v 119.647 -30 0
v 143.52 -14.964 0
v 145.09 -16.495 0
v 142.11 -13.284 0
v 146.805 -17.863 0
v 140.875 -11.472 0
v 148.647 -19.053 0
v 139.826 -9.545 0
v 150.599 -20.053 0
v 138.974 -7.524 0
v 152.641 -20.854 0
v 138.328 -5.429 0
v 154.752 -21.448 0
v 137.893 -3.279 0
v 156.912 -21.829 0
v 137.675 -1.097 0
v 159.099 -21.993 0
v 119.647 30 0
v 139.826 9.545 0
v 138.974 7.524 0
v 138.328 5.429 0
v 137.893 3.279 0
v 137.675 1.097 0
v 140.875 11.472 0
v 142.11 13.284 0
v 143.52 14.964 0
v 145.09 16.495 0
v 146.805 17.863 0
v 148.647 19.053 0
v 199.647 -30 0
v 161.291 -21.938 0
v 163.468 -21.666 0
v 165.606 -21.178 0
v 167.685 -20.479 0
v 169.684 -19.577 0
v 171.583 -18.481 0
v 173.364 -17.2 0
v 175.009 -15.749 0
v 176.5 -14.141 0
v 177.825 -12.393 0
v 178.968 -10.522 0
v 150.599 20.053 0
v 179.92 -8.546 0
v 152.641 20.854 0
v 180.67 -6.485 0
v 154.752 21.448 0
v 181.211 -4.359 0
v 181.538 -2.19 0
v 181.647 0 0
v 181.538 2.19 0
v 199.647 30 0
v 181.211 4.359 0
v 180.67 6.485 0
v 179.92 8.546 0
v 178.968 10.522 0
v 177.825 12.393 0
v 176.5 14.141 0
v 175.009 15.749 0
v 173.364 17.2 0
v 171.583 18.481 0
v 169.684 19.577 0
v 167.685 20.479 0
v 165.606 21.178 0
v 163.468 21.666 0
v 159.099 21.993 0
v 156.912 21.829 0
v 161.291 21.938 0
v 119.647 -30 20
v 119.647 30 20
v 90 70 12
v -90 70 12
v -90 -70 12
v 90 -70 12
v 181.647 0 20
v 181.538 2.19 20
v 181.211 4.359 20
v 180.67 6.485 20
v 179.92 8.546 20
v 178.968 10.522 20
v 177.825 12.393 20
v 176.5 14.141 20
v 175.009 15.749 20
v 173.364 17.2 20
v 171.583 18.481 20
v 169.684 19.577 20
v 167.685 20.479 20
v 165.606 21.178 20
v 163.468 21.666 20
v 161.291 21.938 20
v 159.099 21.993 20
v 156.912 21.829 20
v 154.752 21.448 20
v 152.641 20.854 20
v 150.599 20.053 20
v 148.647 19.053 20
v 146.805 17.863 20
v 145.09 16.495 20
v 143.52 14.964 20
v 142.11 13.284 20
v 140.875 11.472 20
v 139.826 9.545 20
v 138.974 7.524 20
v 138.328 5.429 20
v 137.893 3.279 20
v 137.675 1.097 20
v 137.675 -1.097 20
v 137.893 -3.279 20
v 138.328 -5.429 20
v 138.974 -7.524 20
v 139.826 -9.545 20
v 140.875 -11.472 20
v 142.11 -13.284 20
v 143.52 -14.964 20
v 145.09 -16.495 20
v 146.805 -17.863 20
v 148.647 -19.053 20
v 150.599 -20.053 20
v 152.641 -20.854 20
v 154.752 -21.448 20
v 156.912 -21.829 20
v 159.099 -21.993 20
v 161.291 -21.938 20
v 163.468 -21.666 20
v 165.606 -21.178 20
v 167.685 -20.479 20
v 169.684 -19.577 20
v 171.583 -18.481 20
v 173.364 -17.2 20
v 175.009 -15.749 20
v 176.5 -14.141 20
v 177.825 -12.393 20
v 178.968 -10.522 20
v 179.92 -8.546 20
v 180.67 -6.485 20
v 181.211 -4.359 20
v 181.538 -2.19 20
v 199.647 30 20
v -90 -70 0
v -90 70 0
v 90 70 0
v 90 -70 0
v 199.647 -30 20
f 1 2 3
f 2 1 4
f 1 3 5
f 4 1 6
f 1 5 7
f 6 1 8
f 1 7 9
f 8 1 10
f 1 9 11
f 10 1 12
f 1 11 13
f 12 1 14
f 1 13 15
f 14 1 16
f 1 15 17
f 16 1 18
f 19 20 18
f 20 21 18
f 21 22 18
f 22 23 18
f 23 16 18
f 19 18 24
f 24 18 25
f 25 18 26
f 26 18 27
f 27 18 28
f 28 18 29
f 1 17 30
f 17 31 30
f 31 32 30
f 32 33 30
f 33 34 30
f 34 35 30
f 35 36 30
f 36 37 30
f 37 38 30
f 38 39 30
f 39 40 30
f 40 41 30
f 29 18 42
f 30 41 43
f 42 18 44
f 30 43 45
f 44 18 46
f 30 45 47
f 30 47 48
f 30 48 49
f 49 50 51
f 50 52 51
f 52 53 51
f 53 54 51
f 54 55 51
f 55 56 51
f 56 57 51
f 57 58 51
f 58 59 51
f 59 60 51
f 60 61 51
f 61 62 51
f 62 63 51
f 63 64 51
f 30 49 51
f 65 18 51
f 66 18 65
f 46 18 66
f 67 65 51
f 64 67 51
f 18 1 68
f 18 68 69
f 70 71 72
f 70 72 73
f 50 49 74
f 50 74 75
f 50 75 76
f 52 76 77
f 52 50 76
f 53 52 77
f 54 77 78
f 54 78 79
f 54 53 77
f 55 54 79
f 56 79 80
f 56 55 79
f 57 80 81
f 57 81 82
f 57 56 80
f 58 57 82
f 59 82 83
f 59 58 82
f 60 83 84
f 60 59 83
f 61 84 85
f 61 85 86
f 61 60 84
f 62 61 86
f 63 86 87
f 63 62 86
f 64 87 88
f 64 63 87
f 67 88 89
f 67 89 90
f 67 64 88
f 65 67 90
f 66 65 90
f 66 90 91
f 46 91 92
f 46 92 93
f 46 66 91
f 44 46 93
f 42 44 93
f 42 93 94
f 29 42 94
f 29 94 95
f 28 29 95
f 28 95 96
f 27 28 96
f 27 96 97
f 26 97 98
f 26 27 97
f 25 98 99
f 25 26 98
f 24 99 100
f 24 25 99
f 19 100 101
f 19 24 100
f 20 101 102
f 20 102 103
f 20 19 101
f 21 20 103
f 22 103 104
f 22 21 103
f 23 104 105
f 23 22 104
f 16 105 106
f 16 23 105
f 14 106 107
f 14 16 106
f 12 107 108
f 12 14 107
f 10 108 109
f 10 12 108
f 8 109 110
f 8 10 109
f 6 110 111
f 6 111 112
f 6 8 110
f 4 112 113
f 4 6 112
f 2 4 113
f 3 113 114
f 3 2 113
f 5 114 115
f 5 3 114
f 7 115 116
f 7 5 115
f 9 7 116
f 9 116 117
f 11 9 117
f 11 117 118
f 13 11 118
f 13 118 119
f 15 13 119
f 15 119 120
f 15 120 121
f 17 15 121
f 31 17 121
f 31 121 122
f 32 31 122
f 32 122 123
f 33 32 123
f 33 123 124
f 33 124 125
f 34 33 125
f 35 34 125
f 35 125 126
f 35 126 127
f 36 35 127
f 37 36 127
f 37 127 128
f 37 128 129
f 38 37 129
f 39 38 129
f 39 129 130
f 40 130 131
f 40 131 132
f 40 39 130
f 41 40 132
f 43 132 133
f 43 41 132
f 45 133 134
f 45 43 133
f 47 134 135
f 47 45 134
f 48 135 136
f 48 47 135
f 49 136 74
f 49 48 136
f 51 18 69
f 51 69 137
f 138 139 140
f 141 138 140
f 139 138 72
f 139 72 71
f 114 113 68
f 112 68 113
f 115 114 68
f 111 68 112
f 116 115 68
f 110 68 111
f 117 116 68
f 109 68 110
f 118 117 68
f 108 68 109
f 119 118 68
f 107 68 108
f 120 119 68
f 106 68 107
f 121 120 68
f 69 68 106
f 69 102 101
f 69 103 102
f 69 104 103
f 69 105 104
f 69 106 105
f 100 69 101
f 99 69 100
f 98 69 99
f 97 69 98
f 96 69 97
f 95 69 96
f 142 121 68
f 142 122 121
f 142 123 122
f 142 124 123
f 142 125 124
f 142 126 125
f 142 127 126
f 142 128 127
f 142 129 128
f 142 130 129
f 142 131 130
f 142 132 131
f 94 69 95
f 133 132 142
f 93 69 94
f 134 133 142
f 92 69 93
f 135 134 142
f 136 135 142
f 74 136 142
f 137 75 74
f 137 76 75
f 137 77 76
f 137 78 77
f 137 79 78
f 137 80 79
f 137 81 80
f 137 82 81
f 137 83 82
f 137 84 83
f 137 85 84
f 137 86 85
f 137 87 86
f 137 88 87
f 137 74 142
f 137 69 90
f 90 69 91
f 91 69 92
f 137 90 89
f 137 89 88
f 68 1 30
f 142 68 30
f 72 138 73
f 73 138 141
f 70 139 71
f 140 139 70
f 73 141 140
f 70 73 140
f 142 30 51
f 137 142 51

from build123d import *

# Parameters (mm, degrees)
F0_W     = 180
F0_H     = 140
F1_DEPTH = 12
F2_W     = 80
F2_H     = 60
F2_R     = 22
F3_DEPTH = 20


with BuildPart() as f1:
    # F0 (on Top) → F1 (new body)
    with BuildSketch(Plane.XY):
        Rectangle(F0_W, F0_H)
    extrude(amount=F1_DEPTH)


with BuildPart() as f3:
    # F2 (on Top) → F3 (new body)
    with BuildSketch(Plane.XY):
        with Locations((159.647301, 0)):
            Rectangle(F2_W, F2_H)
        with Locations((159.647301, 0)):
            Circle(F2_R, mode=Mode.SUBTRACT)
    extrude(amount=F3_DEPTH)


solid = Compound([f1.part, f3.part])
